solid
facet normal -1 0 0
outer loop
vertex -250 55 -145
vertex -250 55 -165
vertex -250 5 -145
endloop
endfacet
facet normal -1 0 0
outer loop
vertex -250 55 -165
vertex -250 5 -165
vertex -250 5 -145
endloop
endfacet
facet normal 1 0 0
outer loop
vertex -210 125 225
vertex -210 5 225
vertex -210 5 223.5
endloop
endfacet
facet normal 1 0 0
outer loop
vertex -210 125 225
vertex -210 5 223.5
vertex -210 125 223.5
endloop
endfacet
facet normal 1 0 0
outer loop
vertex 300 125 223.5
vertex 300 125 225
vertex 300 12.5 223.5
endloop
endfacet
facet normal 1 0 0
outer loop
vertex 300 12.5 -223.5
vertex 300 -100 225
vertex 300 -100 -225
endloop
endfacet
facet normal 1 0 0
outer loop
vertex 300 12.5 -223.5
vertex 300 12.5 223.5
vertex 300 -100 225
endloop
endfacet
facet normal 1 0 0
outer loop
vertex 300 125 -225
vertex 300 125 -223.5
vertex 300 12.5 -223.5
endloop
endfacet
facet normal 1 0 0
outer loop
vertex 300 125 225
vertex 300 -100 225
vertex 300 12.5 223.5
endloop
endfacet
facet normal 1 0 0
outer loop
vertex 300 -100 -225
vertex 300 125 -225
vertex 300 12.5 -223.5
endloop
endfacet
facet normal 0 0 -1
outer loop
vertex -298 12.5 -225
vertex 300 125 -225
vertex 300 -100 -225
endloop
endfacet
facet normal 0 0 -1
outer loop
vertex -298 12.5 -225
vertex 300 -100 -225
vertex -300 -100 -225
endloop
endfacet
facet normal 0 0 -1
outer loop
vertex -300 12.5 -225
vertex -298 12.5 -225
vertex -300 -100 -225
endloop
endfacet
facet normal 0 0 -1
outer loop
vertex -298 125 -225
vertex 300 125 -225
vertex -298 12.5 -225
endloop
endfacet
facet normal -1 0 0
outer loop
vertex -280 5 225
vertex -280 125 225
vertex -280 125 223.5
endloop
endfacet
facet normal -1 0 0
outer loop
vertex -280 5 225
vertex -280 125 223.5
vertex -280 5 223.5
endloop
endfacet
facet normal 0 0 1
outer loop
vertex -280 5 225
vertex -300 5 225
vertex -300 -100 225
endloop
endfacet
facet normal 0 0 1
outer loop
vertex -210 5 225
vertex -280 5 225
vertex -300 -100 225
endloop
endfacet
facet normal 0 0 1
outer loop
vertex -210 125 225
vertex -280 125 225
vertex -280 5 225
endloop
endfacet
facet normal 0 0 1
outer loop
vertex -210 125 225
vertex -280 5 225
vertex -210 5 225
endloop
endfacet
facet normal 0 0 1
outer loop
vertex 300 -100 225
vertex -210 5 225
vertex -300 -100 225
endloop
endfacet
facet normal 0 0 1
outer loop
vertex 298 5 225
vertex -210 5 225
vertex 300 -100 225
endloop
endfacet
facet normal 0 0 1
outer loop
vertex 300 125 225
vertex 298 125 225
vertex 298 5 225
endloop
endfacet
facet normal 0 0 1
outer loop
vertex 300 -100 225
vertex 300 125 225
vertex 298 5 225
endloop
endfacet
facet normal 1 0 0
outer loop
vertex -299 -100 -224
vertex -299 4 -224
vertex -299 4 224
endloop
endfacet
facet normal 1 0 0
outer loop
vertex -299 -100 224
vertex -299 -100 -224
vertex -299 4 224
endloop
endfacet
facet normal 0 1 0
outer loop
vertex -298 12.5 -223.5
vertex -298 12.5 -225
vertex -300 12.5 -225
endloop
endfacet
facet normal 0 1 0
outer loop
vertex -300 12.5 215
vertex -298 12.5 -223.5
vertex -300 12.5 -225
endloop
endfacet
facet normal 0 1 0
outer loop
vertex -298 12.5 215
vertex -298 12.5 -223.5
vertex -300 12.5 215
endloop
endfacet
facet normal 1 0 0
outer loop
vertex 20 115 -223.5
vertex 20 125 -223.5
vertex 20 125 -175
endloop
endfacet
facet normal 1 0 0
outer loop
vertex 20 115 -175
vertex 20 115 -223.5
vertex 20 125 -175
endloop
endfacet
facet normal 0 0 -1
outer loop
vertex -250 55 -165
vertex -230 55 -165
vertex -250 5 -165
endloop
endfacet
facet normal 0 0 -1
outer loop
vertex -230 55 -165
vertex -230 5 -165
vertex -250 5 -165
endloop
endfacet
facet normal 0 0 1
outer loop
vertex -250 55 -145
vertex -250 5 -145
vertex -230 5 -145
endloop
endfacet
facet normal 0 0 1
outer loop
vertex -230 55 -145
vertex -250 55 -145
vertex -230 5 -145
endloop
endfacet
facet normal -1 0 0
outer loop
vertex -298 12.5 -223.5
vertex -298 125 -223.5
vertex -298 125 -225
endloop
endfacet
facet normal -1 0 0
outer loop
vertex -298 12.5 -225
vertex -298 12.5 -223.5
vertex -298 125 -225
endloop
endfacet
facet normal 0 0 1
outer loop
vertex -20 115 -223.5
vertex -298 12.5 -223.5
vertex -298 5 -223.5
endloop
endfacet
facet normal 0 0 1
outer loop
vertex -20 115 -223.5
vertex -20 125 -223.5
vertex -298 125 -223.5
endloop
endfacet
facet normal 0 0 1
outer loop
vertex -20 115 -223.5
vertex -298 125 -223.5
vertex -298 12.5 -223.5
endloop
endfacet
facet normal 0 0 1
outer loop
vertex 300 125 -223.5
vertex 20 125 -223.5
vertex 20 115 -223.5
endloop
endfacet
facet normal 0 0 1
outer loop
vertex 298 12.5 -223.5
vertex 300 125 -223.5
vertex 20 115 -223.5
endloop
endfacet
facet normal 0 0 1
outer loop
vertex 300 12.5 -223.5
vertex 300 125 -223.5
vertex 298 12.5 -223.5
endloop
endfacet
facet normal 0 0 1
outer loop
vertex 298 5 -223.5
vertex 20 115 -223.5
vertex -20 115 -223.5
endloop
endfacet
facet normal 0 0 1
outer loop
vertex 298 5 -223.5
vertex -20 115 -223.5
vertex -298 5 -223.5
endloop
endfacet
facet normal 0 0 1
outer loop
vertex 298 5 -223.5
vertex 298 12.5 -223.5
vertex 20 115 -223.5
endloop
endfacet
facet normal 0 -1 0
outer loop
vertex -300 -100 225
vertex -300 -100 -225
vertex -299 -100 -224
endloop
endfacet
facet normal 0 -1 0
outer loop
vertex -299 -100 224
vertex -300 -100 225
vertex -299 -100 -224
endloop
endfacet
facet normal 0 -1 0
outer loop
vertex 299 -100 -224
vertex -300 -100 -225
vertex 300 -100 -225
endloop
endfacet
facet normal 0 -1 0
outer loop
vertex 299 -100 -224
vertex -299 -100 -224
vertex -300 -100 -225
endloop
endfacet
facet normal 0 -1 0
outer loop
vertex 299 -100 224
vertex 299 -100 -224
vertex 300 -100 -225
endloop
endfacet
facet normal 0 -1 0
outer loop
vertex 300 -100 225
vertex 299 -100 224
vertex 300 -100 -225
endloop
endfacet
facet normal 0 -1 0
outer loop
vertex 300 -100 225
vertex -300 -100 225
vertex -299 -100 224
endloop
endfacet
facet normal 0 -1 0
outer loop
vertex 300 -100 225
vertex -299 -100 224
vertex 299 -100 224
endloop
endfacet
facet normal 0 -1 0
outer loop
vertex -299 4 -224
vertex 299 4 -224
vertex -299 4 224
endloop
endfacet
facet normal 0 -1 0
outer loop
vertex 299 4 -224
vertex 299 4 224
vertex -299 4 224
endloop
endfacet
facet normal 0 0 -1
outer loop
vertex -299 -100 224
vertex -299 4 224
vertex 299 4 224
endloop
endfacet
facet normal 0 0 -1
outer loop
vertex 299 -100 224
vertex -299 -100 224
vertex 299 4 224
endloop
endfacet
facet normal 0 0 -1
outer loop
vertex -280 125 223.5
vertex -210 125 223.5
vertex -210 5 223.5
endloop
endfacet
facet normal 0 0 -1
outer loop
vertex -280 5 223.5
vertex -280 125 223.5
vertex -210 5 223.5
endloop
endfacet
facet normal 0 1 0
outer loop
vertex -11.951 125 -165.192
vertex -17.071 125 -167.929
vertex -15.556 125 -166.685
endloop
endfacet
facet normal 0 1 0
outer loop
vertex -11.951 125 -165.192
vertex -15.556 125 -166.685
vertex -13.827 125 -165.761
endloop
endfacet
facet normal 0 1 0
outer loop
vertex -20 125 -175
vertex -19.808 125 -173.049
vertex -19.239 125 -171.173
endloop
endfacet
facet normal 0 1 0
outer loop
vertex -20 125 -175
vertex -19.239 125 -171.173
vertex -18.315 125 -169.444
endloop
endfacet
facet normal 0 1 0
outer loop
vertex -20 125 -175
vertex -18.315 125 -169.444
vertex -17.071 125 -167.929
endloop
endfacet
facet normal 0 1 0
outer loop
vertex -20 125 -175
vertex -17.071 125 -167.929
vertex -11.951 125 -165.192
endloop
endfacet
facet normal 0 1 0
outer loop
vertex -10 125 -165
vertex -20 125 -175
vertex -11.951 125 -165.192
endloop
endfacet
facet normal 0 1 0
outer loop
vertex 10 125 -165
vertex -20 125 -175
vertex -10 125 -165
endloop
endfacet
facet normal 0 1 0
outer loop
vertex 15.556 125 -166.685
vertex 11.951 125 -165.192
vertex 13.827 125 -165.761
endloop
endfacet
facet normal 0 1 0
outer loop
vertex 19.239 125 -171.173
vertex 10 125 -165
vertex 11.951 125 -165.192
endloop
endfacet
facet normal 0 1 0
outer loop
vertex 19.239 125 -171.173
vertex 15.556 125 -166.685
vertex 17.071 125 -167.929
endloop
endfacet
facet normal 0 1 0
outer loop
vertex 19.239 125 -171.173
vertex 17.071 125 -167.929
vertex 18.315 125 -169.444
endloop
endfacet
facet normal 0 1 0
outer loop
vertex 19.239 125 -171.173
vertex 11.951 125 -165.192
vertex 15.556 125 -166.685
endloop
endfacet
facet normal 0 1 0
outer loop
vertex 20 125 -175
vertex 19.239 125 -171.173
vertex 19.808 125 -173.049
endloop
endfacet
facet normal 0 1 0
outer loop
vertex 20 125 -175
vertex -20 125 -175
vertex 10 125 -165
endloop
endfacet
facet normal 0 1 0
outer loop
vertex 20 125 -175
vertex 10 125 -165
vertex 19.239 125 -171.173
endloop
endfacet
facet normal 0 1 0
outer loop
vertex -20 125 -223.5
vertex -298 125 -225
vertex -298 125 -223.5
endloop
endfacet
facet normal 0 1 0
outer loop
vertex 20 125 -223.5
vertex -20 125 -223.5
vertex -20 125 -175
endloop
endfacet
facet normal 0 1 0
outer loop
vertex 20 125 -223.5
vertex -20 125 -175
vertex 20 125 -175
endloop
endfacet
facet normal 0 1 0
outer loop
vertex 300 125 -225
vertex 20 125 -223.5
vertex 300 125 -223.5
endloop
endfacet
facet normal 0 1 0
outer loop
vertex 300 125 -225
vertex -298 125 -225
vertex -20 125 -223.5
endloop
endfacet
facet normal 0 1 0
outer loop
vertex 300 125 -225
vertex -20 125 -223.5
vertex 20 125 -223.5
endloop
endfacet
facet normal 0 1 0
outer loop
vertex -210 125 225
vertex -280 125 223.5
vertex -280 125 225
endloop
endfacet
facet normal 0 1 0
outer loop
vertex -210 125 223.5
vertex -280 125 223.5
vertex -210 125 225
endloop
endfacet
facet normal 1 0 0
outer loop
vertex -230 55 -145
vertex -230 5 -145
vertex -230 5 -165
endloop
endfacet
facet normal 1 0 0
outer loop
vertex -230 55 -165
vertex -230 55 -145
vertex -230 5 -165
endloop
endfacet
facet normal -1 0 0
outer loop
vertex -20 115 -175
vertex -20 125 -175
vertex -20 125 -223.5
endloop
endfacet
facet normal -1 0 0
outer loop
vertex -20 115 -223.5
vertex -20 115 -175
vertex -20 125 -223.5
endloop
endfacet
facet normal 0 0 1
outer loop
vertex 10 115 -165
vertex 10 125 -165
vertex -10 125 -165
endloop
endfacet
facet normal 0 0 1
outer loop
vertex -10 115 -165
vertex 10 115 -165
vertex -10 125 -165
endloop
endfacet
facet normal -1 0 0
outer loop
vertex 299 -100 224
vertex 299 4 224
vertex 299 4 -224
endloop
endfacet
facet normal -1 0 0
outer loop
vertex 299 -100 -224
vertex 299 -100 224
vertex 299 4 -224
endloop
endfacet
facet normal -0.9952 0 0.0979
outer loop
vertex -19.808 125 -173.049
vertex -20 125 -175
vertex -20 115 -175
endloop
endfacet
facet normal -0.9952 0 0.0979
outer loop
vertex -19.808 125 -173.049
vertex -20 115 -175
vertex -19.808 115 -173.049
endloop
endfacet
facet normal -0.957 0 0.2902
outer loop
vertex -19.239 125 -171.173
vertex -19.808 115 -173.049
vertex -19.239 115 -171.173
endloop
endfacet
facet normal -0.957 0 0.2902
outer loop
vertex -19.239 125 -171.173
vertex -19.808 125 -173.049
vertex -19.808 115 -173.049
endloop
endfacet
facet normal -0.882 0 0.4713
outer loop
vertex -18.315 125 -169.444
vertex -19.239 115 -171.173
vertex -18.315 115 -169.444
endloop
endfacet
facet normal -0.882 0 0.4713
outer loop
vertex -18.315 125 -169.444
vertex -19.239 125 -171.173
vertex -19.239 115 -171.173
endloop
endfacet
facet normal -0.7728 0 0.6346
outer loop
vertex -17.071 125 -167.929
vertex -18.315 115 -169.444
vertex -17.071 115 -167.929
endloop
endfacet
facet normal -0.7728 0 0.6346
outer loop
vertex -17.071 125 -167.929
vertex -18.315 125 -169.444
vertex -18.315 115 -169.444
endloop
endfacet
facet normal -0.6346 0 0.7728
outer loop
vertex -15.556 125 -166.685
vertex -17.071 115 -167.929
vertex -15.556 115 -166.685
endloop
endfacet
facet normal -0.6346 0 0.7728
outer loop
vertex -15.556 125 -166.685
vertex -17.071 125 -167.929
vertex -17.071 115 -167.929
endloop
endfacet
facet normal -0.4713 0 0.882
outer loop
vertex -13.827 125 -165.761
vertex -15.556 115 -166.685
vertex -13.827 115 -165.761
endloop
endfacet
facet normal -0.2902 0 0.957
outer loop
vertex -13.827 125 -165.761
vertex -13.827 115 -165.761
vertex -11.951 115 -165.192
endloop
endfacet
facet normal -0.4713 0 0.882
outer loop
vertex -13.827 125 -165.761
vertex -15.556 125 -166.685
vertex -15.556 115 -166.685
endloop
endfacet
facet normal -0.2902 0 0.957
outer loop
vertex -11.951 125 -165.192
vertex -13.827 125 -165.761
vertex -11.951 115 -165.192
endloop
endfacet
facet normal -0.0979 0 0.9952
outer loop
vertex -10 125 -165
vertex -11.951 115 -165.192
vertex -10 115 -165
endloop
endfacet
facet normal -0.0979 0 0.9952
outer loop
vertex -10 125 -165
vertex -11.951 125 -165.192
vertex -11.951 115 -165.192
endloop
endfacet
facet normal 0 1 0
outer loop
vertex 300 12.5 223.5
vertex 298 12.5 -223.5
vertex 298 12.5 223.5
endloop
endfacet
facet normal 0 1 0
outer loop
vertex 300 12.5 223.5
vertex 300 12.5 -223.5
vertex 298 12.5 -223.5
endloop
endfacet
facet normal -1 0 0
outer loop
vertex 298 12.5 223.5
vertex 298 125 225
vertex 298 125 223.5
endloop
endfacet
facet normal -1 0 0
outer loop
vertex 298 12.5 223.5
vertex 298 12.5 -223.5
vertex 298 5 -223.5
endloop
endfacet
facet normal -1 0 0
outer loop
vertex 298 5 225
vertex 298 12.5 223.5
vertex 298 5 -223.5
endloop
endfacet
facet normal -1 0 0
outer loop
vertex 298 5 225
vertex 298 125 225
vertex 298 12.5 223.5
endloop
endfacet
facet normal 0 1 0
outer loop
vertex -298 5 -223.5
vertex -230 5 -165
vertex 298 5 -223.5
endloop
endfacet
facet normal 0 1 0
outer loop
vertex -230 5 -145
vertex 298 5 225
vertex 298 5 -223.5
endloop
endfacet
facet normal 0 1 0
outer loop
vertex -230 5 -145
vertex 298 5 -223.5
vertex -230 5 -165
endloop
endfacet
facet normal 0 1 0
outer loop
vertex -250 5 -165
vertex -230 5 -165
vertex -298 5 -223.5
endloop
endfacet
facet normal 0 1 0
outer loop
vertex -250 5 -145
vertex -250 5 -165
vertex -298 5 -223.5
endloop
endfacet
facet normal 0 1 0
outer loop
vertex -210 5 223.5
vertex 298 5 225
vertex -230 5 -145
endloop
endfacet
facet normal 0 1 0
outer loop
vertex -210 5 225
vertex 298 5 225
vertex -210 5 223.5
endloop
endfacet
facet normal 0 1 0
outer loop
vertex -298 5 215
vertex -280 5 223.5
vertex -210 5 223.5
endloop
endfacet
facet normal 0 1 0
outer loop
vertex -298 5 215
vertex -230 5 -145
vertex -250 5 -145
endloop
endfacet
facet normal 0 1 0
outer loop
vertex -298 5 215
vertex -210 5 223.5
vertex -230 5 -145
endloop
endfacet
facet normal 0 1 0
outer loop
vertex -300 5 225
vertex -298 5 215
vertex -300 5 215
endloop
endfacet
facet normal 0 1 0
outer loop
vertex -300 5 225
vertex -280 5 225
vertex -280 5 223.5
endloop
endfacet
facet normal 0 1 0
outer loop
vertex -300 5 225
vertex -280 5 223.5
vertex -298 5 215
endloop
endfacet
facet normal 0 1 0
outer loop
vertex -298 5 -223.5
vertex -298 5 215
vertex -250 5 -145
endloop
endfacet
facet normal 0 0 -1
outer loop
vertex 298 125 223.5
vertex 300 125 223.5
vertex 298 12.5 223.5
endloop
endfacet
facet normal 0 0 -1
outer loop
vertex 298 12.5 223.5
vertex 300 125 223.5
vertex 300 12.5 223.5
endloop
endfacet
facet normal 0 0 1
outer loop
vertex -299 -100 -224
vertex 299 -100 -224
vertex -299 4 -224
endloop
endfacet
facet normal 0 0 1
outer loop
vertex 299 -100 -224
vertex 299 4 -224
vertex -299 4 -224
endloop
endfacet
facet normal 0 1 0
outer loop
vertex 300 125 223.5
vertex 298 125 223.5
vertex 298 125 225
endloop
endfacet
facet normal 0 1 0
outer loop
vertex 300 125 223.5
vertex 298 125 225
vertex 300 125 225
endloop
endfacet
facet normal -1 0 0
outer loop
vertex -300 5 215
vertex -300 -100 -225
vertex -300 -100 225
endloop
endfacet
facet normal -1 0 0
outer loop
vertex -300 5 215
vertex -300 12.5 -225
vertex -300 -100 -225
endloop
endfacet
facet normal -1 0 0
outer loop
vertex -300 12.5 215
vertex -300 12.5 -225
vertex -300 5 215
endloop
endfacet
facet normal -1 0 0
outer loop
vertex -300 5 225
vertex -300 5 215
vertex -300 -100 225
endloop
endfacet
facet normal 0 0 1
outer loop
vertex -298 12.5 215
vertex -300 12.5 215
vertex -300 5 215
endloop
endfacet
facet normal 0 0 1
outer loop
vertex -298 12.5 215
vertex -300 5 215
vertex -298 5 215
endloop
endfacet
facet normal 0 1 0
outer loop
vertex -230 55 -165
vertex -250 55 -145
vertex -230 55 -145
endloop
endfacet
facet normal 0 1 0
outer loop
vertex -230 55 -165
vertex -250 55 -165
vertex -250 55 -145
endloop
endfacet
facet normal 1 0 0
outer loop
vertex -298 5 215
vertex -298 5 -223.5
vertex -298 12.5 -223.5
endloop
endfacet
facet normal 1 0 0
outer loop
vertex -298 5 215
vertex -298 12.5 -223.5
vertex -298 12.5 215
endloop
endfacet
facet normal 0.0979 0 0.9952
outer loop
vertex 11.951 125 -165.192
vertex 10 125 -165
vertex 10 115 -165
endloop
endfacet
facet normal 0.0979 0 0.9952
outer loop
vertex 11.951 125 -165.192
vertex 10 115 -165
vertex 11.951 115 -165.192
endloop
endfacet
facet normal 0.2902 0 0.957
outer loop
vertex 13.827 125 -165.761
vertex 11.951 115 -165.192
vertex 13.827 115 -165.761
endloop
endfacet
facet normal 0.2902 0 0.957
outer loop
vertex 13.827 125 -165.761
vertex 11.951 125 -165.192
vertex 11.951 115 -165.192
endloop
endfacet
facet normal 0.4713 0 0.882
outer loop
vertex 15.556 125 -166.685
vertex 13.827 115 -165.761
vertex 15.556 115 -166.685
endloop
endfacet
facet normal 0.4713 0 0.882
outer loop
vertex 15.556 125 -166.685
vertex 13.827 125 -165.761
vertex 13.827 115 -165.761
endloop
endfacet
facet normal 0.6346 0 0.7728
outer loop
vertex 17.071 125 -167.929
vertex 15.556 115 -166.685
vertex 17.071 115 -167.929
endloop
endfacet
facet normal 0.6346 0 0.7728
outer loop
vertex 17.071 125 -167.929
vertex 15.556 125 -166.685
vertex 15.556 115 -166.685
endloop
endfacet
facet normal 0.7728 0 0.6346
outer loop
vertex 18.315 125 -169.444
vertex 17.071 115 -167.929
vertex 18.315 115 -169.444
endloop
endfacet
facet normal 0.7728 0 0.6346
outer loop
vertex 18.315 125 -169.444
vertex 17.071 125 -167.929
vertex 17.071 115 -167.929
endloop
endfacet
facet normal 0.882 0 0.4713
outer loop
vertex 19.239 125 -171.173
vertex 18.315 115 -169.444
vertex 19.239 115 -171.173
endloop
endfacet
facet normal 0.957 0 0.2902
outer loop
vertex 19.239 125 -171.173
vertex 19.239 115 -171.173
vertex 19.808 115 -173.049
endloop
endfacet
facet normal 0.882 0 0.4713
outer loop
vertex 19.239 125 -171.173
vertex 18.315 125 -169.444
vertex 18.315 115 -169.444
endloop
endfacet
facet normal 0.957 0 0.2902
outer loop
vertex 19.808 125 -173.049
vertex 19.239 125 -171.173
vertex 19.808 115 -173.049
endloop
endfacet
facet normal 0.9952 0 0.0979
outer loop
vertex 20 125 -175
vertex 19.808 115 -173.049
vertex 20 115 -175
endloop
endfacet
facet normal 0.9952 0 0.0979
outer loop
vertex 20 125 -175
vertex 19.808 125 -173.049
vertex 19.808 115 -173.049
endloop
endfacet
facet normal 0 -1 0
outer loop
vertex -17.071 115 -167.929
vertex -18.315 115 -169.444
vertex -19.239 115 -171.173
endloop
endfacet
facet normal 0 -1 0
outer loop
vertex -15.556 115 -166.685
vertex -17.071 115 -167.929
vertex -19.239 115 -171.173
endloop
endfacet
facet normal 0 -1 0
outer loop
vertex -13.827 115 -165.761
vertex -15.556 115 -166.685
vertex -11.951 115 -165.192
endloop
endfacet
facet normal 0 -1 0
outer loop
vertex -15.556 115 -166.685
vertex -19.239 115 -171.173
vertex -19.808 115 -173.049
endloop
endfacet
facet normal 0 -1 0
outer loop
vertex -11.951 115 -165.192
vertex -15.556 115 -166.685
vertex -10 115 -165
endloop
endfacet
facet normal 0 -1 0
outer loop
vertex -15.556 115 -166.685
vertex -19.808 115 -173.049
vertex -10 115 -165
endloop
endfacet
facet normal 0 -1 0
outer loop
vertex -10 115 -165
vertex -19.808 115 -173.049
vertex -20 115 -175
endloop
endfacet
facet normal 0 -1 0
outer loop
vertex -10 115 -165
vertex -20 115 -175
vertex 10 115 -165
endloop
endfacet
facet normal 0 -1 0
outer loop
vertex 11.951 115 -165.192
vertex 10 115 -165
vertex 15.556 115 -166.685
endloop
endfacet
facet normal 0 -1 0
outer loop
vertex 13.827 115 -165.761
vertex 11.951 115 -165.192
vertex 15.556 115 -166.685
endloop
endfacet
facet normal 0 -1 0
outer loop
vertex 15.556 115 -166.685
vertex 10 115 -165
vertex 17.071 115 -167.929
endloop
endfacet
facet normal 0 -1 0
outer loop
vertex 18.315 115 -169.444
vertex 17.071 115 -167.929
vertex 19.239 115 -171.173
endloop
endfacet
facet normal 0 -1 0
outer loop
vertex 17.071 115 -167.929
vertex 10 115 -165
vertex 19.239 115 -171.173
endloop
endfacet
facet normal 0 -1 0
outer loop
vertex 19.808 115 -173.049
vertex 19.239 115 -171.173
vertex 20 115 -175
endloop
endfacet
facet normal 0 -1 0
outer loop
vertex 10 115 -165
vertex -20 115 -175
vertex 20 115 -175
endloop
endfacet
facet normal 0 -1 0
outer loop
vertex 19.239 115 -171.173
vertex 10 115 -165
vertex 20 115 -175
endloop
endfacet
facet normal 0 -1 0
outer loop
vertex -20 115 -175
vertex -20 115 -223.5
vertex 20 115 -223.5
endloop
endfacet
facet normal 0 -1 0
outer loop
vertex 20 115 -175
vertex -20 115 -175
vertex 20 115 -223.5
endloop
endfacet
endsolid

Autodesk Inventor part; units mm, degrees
ref_plane "YZ Plane" through (0, 0, 0) normal (1, 0, 0) x (0, 1, 0)
ref_plane "XZ Plane" through (0, 0, 0) normal (0, 1, 0) x (-1, 0, 0)
ref_plane "XY Plane" through (0, 0, 0) normal (0, 0, 1) x (1, 0, 0)
sketch "Sketch1" plane through (0, 0, 0) normal (0, 1, 0) x (-1, 0, 0)
  line L0 (-300, 225) -> (300, 225)
  line L1 (300, 225) -> (300, -225)
  line L2 (300, -225) -> (-300, -225)
  line L3 (-300, -225) -> (-300, 225)
  line L4 (-300, 225) -> (300, -225) construction
  line L5 (300, 225) -> (-300, -225) construction
  point P0 (0, 0)
  dimension "d0" = 600
  dimension "d1" = 450
extrude "Extrusion1" add sketch "Sketch1" along normal blind 5
sketch "Sketch6" plane through (0, 5, 0) normal (0, 1, 0) x (1, 0, 0)
  line L0 (300, 225) -> (-300, 225) projected
  line L1 (-300, -225) -> (300, -225)
  line L2 (300, -225) -> (300, 225)
  line L3 (300, 225) -> (-300, 225)
  line L4 (-300, 225) -> (-300, -225)
  line L5 (-300, -225) -> (300, 225) construction
  line L6 (300, -225) -> (-300, 225) construction
  line L7 (-298, -223.5) -> (298, -223.5)
  line L8 (298, -223.5) -> (298, 223.5)
  line L9 (298, 223.5) -> (-298, 223.5)
  line L10 (-298, 223.5) -> (-298, -223.5)
  line L11 (-298, -223.5) -> (298, 223.5) construction
  line L12 (298, -223.5) -> (-298, 223.5) construction
  point P0 (0, 0)
  dimension "d26" = 2
extrude "Extrusion7" add sketch "Sketch6" along normal blind 120
sketch "Sketch7" plane through (0, 0, 0) normal (0, -1, 0) x (1, 0, 0)
  line L0 (300, 225) -> (300, -225) projected
  line L1 (-300, 225) -> (300, 225)
  line L2 (300, 225) -> (300, -225)
  line L3 (300, -225) -> (-300, -225)
  line L4 (-300, -225) -> (-300, 225)
  line L5 (-300, 225) -> (300, -225) construction
  line L6 (300, 225) -> (-300, -225) construction
  point P0 (0, 0)
extrude "Extrusion8" add sketch "Sketch7" along normal blind 100
shell "Shell1" thickness 1 removed faces 1 at (-100, -100, 75)
mirror "Mirror1" about plane through (0, 0, 0) normal (0, 0, 1)
sketch "Sketch9" plane through (0, 125, 0) normal (0, 1, 0) x (1, 0, 0)
  line L0 (300, 225) -> (-300, 225) projected
  line L1 (-20, 225) -> (20, 225)
  line L2 (20, 225) -> (20, 175)
  line L3 (10, 165) -> (-10, 165)
  line L4 (-20, 175) -> (-20, 225)
  arc A0 (-20, 175) -> (-10, 165) centre (-10, 175) ccw
  arc A1 (10, 165) -> (20, 175) centre (10, 175) ccw
  point P0 (0, 0)
  point P1 (20, 165)
  point P2 (-20, 165)
  point P3 (0, 225)
  dimension "d37" = 40
  dimension "d38" = 60
  dimension "d39" = 10
extrude "Extrusion10" add sketch "Sketch9" against normal blind 10
sketch "Sketch10" plane through (0, 5, 0) normal (0, 1, 0) x (1, 0, 0)
  line L0 (-230, 165) -> (-250, 165)
  line L1 (-250, 165) -> (-250, 145)
  line L2 (-250, 145) -> (-230, 145)
  line L3 (-230, 145) -> (-230, 165)
  line L4 (-300, 225) -> (-300, -225) projected
  line L5 (300, 225) -> (-300, 225) projected
  point P0 (0, 0)
  point P1 (-250, 155)
  point P2 (-240, 165)
  dimension "d42" = 20
  dimension "d43" = 20
  dimension "d44" = 50
  dimension "d45" = 60
extrude "Extrusion11" add sketch "Sketch10" along normal blind 50
sketch "Sketch11" plane through (-298, 5, 223.5) normal (1, 0, 0) x (0, 0, -1)
  line L0 (448.5, 120) -> (448.5, -105) projected
  line L1 (0, 120) -> (448.5, 120)
  line L2 (448.5, 120) -> (448.5, 7.5)
  line L3 (448.5, 7.5) -> (0, 7.5)
  line L4 (0, 7.5) -> (0, 120)
  point P0 (223.5, -5)
extrude "Extrusion12" cut sketch "Sketch11" against normal through all
sketch "Sketch12" plane through (300, 125, 225) normal (1, 0, 0) x (0, 0, -1)
  line L0 (1.5, 0) -> (1.5, -112.5) projected
  line L1 (448.5, -120) -> (448.5, -112.5) projected
  line L2 (1.5, 0) -> (448.5, 0)
  line L3 (448.5, 0) -> (448.5, -112.5)
  line L4 (448.5, -112.5) -> (1.5, -112.5)
  line L5 (1.5, -112.5) -> (1.5, 0)
  point P0 (225, -125)
extrude "Extrusion13" cut sketch "Sketch12" against normal blind 10
sketch "Sketch13" plane through (-300, 125, 225) normal (0, 0, 1) x (1, 0, 0)
  line L0 (2, 0) -> (280, 0) projected
  line L1 (598, -120) -> (2, -120) projected
  line L2 (90, 0) -> (598, 0)
  line L3 (598, 0) -> (598, -120)
  line L4 (598, -120) -> (90, -120)
  line L5 (90, -120) -> (90, 0)
  line L6 (0, -225) -> (0, 0) projected
  point P0 (300, -125)
  point P1 (90, -120)
  dimension "d52" = 90
extrude "Extrusion14" cut sketch "Sketch13" against normal blind 10
sketch "Sketch14" plane through (298, 5, 225) normal (0, 0, 1) x (1, 0, 0)
  line L0 (-598, -105) -> (-598, 120) projected
  line L1 (-596, 0) -> (-508, 0) projected
  line L2 (-598, 120) -> (-578, 120)
  line L3 (-578, 120) -> (-578, 0)
  line L4 (-578, 0) -> (-598, 0)
  line L5 (-598, 0) -> (-598, 120)
  point P0 (-298, -5)
  dimension "d55" = 20
extrude "Extrusion15" cut sketch "Sketch14" against normal blind 10
sketch "Sketch15" plane through (300, -100, -225) normal (0, 0, -1) x (-1, 0, 0)
  point P0 (300, 100)
ref_plane "Work Plane1" through (0, 0, 0) normal (0, 0, 1) x (1, 0, 0)
properties part number "game base"
